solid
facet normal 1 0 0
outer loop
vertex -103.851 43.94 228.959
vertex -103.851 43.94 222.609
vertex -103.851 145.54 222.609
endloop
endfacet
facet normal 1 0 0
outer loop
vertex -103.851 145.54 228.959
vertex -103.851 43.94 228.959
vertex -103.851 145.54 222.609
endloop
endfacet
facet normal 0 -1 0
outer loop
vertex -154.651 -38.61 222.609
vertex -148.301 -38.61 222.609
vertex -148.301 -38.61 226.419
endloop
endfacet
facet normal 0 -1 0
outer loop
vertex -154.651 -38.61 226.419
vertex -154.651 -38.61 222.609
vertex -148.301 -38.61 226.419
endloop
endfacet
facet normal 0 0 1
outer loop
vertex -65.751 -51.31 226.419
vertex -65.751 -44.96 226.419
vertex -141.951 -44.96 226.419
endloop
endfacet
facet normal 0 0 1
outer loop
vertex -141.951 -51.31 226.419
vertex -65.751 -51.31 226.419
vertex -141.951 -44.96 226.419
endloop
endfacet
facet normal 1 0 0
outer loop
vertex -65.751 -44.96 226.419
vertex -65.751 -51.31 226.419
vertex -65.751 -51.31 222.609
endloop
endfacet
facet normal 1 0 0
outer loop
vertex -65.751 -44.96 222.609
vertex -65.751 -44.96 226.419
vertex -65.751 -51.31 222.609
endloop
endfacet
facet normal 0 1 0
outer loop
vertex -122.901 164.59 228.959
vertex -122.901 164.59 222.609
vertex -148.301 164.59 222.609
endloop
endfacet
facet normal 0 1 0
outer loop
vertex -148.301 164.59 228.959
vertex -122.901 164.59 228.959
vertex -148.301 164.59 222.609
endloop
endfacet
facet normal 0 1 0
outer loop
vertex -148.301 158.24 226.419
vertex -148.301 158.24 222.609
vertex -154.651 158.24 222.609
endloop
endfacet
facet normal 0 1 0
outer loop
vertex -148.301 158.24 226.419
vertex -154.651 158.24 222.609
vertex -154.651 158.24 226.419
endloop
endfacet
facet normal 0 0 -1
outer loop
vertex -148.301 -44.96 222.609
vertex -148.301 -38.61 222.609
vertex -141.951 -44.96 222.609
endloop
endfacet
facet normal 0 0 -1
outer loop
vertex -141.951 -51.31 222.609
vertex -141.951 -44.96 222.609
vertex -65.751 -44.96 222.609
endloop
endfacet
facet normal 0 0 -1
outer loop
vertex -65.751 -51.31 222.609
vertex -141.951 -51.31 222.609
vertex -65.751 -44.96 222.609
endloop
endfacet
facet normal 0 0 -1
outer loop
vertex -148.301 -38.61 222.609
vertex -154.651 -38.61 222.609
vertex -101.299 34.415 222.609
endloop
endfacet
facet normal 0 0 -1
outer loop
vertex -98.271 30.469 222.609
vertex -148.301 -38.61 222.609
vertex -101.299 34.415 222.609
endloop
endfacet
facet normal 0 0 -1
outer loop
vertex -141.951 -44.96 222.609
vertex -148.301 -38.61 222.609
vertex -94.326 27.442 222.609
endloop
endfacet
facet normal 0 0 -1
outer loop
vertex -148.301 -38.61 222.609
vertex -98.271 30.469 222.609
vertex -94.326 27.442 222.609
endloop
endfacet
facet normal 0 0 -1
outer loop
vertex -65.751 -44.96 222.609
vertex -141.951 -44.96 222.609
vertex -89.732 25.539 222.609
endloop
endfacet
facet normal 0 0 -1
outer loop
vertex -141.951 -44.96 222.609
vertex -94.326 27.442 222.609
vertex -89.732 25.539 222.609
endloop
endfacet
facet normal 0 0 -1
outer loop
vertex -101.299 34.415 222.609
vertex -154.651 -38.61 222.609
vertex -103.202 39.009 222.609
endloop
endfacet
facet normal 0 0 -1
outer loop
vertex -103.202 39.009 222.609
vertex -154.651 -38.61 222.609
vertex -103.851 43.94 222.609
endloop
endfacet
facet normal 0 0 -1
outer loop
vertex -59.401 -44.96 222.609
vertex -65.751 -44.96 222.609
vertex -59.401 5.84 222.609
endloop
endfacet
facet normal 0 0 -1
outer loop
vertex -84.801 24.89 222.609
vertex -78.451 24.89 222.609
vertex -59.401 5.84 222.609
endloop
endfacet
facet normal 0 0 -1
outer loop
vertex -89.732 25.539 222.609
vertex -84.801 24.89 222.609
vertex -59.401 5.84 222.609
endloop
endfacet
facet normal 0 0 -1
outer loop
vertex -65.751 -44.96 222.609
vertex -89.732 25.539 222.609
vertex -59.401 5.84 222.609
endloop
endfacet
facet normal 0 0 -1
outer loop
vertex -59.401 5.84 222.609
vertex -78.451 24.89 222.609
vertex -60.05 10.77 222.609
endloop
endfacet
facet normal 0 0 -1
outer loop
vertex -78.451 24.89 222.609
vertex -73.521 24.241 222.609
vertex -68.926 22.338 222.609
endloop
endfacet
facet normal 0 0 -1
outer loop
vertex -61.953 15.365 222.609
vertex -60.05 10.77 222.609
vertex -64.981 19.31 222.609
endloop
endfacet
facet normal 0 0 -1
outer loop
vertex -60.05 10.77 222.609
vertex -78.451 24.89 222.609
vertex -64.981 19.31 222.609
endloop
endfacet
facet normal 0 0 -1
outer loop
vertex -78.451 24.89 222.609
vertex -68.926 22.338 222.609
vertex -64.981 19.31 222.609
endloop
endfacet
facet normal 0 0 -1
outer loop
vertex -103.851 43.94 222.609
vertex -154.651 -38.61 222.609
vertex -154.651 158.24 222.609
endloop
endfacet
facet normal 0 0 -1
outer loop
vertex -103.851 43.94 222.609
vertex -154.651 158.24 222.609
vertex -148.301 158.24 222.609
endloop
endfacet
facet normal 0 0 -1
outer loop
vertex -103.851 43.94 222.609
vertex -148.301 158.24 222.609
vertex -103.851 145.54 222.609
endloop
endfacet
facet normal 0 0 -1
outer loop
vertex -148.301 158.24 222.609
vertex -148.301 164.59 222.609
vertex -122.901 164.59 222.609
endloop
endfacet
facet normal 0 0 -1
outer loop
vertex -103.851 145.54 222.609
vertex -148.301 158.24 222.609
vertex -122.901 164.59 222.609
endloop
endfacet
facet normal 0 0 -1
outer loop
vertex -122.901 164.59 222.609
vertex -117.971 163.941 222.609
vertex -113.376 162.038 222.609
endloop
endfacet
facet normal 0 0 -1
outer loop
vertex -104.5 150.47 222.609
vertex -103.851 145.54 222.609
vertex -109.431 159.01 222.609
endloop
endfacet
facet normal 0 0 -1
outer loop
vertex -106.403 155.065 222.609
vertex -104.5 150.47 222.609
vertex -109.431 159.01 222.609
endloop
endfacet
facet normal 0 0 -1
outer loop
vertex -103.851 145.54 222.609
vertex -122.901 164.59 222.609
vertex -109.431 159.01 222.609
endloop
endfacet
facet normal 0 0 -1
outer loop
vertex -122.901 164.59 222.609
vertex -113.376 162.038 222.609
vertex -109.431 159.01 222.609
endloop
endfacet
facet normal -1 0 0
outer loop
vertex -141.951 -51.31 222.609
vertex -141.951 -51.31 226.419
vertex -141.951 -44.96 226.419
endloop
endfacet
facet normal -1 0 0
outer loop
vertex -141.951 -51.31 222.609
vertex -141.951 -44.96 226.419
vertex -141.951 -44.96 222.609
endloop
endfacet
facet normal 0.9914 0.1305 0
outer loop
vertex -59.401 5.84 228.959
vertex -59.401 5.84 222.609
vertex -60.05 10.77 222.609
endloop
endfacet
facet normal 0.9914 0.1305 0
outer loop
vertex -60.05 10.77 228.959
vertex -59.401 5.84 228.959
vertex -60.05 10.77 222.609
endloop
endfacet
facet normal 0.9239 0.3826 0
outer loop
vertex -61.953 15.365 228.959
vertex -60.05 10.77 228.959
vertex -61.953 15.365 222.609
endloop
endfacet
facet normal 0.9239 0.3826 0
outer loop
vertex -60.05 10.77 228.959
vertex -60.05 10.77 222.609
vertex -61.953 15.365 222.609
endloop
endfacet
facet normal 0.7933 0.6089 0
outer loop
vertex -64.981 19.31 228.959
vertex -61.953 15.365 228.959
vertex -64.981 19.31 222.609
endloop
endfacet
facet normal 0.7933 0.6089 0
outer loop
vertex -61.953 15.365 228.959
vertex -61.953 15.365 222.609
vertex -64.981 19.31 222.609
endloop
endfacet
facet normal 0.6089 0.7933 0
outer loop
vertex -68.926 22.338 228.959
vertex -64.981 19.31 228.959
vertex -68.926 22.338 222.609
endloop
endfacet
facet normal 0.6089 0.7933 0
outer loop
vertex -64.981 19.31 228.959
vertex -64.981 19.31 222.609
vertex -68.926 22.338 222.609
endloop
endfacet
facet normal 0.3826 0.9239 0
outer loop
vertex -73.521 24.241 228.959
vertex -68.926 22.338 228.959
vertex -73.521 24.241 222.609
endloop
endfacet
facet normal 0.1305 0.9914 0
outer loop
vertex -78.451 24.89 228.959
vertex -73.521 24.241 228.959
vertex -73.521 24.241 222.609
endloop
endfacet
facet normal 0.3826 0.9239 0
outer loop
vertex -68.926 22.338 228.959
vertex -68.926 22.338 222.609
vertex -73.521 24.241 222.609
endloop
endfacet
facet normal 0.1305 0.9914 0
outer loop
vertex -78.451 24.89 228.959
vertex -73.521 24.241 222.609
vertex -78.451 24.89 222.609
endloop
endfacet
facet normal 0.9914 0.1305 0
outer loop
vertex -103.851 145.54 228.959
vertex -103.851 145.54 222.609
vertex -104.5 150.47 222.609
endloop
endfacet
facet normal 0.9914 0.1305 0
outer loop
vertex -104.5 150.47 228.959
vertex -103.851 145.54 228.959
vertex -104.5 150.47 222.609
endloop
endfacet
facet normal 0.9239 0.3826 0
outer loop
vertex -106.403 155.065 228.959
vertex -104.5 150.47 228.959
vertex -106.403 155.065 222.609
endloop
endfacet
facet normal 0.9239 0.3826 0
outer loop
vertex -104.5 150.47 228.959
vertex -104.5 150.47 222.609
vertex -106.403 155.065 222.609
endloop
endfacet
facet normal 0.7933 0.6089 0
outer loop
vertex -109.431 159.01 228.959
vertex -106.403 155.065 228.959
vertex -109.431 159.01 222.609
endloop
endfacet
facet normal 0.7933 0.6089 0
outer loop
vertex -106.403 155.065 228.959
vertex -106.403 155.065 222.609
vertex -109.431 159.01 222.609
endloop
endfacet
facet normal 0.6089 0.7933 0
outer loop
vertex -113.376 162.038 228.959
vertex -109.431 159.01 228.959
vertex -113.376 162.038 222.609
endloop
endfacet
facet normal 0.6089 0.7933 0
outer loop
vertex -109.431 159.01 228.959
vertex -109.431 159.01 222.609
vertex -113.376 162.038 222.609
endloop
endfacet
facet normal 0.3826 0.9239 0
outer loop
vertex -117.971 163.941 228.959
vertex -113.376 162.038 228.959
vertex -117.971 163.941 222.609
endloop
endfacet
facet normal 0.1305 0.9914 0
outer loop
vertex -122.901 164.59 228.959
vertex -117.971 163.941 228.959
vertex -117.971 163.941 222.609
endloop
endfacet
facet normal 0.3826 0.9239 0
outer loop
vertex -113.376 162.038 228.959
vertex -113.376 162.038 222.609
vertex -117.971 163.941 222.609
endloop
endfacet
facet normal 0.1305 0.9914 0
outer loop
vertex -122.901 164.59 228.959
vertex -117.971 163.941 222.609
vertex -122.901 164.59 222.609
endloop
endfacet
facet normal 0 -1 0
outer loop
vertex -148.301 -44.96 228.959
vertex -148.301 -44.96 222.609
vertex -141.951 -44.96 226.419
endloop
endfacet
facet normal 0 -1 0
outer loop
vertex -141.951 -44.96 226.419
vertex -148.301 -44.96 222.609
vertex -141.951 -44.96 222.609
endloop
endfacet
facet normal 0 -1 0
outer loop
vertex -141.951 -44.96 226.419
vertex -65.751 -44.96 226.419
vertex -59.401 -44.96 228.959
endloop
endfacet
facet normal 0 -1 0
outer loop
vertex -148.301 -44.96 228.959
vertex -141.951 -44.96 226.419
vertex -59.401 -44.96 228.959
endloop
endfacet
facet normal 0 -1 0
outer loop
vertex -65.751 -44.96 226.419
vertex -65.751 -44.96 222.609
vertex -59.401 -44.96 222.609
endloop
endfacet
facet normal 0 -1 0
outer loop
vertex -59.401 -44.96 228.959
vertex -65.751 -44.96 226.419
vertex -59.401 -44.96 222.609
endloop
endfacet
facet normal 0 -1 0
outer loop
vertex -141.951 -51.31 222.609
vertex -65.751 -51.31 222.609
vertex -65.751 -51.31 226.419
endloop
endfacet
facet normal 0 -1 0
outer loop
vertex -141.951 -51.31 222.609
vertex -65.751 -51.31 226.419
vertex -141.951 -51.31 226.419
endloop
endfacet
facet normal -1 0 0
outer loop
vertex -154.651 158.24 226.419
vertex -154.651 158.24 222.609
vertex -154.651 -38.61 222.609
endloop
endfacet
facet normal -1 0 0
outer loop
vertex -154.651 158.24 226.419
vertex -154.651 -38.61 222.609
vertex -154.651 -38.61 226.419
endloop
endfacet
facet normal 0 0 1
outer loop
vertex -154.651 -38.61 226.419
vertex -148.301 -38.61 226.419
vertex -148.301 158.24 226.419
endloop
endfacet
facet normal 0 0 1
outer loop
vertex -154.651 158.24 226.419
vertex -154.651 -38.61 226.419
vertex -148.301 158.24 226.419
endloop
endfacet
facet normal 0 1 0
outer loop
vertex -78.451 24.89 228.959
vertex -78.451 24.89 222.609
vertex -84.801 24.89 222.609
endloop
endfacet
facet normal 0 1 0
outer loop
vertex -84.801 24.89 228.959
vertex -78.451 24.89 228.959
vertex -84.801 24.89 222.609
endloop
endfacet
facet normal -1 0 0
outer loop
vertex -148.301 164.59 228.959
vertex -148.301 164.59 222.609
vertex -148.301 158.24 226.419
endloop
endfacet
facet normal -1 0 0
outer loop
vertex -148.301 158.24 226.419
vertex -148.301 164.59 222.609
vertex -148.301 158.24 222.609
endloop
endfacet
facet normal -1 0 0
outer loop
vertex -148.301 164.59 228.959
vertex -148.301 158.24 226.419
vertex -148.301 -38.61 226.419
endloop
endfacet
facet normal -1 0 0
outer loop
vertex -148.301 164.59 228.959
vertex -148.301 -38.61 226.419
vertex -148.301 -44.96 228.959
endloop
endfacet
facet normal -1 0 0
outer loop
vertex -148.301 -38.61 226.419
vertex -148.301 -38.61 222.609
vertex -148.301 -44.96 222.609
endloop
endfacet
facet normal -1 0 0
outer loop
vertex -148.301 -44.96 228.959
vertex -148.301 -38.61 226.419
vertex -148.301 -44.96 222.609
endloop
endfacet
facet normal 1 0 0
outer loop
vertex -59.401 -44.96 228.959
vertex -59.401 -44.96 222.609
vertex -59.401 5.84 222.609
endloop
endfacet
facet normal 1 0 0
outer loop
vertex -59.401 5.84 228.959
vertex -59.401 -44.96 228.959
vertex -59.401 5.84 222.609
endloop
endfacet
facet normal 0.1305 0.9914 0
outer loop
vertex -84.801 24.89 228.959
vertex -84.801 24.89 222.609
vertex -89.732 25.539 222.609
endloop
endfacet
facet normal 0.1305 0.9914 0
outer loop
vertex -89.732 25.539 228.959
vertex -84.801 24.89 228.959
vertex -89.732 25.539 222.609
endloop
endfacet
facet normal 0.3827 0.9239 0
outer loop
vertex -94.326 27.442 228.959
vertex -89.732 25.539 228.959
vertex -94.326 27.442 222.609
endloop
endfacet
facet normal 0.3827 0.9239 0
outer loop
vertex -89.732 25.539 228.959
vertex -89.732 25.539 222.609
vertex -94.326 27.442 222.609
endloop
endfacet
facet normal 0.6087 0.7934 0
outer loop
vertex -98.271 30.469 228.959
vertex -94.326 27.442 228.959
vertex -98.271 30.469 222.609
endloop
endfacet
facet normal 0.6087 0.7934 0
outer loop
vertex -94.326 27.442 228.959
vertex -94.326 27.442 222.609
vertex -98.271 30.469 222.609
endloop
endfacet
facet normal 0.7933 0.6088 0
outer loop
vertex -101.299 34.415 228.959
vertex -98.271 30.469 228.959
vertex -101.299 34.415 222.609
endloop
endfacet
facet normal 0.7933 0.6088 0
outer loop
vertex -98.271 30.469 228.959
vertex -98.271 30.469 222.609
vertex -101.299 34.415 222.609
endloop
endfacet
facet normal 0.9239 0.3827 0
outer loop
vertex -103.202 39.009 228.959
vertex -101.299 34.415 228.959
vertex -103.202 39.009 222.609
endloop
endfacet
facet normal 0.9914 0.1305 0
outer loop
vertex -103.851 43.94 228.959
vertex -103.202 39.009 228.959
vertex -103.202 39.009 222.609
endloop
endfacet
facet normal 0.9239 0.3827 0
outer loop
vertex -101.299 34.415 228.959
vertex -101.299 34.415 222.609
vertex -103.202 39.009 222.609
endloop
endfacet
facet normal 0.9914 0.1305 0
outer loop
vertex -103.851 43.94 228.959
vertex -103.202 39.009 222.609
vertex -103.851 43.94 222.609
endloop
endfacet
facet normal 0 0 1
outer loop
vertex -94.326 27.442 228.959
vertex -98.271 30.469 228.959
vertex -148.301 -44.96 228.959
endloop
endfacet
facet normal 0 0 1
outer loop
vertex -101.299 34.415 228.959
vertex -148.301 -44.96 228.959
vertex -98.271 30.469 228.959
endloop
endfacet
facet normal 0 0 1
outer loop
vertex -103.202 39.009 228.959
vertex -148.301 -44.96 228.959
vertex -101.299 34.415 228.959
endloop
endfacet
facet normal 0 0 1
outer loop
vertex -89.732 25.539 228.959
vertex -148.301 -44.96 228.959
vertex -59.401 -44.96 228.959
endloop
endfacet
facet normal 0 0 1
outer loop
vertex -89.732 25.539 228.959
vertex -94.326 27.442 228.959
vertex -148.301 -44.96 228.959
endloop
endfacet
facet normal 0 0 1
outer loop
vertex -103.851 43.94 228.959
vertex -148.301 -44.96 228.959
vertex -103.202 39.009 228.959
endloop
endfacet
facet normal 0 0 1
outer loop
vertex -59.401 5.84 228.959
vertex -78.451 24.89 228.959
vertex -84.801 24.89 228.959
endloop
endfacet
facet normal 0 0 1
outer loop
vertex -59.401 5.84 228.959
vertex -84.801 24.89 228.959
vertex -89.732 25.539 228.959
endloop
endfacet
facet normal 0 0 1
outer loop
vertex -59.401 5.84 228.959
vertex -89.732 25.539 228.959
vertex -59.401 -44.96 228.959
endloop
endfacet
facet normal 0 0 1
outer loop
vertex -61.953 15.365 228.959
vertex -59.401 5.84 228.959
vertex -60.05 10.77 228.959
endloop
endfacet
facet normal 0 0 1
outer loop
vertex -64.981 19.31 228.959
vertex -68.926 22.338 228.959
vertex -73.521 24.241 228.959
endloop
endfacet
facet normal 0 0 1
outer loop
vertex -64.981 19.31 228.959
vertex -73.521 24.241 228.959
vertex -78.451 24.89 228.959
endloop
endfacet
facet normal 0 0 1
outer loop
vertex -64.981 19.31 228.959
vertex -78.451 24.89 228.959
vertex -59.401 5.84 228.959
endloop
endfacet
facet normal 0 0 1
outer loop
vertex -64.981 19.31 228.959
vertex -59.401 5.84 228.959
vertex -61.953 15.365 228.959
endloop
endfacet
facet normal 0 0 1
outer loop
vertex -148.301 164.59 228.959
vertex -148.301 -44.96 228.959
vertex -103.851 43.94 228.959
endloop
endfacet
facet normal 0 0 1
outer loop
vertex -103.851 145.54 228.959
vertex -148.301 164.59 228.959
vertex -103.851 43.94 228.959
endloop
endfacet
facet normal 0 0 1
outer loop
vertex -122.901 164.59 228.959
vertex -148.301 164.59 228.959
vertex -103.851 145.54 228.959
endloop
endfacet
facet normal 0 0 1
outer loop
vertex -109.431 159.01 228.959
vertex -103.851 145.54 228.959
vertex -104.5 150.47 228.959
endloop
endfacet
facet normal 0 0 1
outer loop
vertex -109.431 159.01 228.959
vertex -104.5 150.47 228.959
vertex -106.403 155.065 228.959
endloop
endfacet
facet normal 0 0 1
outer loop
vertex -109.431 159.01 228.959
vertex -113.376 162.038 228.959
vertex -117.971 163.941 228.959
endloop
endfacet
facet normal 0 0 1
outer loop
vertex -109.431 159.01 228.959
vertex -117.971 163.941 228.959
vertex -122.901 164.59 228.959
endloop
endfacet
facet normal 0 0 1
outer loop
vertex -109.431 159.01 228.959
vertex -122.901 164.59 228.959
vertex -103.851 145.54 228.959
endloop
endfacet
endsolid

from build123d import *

# Parameters (mm, degrees)
SALIENTE_EXTRUIR3_DEPTH = 6.35
CROQUIS5_W              = 2.54
CROQUIS5_H              = 196.85
CORTAR_EXTRUIR1_DEPTH   = 6.35
CROQUIS6_W              = 6.35
CROQUIS6_H              = 196.85
CROQUIS6_W_2            = 76.2
CROQUIS6_H_2            = 6.35
CORTAR_EXTRUIR2_DEPTH   = 7.35
CROQUIS7_W              = 3.81
CROQUIS7_H              = 196.85
SALIENTE_EXTRUIR5_DEPTH = 6.35
CROQUIS8_W              = 76.2
CROQUIS8_H              = 3.81
SALIENTE_EXTRUIR6_DEPTH = 6.35


with BuildPart() as part:
    # Croquis2 → Saliente-Extruir3 (new body)
    with BuildSketch(Plane.XY):
        with BuildLine():
            Line((0, 0), (6.35, 0))
            Line((6.35, 0), (6.35, -6.35))
            Line((6.35, -6.35), (82.55, -6.35))
            Line((82.55, -6.35), (82.55, 0))
            Line((82.55, 0), (88.9, 0))
            Line((88.9, 0), (88.9, 50.8))
            ThreePointArc((88.9, 50.8), (83.320384182, 64.270384182), (69.85, 69.85))
            Line((69.85, 69.85), (63.5, 69.85))
            ThreePointArc((63.5, 69.85), (50.029615818, 75.429615818), (44.45, 88.9))
            Line((44.45, 88.9), (44.45, 190.5))
            ThreePointArc((44.45, 190.5), (38.870384182, 203.970384182), (25.4, 209.55))
            Line((25.4, 209.55), (0, 209.55))
            Line((0, 209.55), (0, 203.2))
            Line((0, 203.2), (-6.35, 203.2))
            Line((-6.35, 203.2), (-6.35, 6.35))
            Line((-6.35, 6.35), (0, 6.35))
            Line((0, 6.35), (0, 0))
        make_face()
    extrude(amount=SALIENTE_EXTRUIR3_DEPTH)

    # Croquis5 → Cortar-Extruir1 (cut)
    with BuildSketch(Plane.ZY.offset(6.35)):
        with Locations((1.27, 104.775)):
            Rectangle(CROQUIS5_W, CROQUIS5_H)
    extrude(amount=-CORTAR_EXTRUIR1_DEPTH, mode=Mode.SUBTRACT)


with BuildPart() as part_1:
    # Sólido-Mover/Copiar1: moved
    add(part.part.moved(Location((-148.301048564, -44.960118156, 222.608991853))))

    # Croquis6 → Cortar-Extruir2 (cut, through all)
    with BuildSketch(Plane.XY.offset(228.958991853)):
        with Locations((-151.476048564, 59.814881844)):
            Rectangle(CROQUIS6_W, CROQUIS6_H)
        with Locations((-103.851048564, -48.135118156)):
            Rectangle(CROQUIS6_W_2, CROQUIS6_H_2)
    extrude(amount=-CORTAR_EXTRUIR2_DEPTH, mode=Mode.SUBTRACT)

    # Croquis7 → Saliente-Extruir5 (add)
    with BuildSketch(Plane.ZY.offset(148.301048564)):
        with Locations((224.513991853, 59.814881844)):
            Rectangle(CROQUIS7_W, CROQUIS7_H)
    extrude(amount=SALIENTE_EXTRUIR5_DEPTH)

    # Croquis8 → Saliente-Extruir6 (add)
    with BuildSketch(Plane(origin=(0, -44.960118156, 0), x_dir=(-1, 0, 0), z_dir=(0, -1, 0))):
        with Locations((103.851048564, -224.513991853)):
            Rectangle(CROQUIS8_W, CROQUIS8_H)
    extrude(amount=SALIENTE_EXTRUIR6_DEPTH)


solid = part_1.part
